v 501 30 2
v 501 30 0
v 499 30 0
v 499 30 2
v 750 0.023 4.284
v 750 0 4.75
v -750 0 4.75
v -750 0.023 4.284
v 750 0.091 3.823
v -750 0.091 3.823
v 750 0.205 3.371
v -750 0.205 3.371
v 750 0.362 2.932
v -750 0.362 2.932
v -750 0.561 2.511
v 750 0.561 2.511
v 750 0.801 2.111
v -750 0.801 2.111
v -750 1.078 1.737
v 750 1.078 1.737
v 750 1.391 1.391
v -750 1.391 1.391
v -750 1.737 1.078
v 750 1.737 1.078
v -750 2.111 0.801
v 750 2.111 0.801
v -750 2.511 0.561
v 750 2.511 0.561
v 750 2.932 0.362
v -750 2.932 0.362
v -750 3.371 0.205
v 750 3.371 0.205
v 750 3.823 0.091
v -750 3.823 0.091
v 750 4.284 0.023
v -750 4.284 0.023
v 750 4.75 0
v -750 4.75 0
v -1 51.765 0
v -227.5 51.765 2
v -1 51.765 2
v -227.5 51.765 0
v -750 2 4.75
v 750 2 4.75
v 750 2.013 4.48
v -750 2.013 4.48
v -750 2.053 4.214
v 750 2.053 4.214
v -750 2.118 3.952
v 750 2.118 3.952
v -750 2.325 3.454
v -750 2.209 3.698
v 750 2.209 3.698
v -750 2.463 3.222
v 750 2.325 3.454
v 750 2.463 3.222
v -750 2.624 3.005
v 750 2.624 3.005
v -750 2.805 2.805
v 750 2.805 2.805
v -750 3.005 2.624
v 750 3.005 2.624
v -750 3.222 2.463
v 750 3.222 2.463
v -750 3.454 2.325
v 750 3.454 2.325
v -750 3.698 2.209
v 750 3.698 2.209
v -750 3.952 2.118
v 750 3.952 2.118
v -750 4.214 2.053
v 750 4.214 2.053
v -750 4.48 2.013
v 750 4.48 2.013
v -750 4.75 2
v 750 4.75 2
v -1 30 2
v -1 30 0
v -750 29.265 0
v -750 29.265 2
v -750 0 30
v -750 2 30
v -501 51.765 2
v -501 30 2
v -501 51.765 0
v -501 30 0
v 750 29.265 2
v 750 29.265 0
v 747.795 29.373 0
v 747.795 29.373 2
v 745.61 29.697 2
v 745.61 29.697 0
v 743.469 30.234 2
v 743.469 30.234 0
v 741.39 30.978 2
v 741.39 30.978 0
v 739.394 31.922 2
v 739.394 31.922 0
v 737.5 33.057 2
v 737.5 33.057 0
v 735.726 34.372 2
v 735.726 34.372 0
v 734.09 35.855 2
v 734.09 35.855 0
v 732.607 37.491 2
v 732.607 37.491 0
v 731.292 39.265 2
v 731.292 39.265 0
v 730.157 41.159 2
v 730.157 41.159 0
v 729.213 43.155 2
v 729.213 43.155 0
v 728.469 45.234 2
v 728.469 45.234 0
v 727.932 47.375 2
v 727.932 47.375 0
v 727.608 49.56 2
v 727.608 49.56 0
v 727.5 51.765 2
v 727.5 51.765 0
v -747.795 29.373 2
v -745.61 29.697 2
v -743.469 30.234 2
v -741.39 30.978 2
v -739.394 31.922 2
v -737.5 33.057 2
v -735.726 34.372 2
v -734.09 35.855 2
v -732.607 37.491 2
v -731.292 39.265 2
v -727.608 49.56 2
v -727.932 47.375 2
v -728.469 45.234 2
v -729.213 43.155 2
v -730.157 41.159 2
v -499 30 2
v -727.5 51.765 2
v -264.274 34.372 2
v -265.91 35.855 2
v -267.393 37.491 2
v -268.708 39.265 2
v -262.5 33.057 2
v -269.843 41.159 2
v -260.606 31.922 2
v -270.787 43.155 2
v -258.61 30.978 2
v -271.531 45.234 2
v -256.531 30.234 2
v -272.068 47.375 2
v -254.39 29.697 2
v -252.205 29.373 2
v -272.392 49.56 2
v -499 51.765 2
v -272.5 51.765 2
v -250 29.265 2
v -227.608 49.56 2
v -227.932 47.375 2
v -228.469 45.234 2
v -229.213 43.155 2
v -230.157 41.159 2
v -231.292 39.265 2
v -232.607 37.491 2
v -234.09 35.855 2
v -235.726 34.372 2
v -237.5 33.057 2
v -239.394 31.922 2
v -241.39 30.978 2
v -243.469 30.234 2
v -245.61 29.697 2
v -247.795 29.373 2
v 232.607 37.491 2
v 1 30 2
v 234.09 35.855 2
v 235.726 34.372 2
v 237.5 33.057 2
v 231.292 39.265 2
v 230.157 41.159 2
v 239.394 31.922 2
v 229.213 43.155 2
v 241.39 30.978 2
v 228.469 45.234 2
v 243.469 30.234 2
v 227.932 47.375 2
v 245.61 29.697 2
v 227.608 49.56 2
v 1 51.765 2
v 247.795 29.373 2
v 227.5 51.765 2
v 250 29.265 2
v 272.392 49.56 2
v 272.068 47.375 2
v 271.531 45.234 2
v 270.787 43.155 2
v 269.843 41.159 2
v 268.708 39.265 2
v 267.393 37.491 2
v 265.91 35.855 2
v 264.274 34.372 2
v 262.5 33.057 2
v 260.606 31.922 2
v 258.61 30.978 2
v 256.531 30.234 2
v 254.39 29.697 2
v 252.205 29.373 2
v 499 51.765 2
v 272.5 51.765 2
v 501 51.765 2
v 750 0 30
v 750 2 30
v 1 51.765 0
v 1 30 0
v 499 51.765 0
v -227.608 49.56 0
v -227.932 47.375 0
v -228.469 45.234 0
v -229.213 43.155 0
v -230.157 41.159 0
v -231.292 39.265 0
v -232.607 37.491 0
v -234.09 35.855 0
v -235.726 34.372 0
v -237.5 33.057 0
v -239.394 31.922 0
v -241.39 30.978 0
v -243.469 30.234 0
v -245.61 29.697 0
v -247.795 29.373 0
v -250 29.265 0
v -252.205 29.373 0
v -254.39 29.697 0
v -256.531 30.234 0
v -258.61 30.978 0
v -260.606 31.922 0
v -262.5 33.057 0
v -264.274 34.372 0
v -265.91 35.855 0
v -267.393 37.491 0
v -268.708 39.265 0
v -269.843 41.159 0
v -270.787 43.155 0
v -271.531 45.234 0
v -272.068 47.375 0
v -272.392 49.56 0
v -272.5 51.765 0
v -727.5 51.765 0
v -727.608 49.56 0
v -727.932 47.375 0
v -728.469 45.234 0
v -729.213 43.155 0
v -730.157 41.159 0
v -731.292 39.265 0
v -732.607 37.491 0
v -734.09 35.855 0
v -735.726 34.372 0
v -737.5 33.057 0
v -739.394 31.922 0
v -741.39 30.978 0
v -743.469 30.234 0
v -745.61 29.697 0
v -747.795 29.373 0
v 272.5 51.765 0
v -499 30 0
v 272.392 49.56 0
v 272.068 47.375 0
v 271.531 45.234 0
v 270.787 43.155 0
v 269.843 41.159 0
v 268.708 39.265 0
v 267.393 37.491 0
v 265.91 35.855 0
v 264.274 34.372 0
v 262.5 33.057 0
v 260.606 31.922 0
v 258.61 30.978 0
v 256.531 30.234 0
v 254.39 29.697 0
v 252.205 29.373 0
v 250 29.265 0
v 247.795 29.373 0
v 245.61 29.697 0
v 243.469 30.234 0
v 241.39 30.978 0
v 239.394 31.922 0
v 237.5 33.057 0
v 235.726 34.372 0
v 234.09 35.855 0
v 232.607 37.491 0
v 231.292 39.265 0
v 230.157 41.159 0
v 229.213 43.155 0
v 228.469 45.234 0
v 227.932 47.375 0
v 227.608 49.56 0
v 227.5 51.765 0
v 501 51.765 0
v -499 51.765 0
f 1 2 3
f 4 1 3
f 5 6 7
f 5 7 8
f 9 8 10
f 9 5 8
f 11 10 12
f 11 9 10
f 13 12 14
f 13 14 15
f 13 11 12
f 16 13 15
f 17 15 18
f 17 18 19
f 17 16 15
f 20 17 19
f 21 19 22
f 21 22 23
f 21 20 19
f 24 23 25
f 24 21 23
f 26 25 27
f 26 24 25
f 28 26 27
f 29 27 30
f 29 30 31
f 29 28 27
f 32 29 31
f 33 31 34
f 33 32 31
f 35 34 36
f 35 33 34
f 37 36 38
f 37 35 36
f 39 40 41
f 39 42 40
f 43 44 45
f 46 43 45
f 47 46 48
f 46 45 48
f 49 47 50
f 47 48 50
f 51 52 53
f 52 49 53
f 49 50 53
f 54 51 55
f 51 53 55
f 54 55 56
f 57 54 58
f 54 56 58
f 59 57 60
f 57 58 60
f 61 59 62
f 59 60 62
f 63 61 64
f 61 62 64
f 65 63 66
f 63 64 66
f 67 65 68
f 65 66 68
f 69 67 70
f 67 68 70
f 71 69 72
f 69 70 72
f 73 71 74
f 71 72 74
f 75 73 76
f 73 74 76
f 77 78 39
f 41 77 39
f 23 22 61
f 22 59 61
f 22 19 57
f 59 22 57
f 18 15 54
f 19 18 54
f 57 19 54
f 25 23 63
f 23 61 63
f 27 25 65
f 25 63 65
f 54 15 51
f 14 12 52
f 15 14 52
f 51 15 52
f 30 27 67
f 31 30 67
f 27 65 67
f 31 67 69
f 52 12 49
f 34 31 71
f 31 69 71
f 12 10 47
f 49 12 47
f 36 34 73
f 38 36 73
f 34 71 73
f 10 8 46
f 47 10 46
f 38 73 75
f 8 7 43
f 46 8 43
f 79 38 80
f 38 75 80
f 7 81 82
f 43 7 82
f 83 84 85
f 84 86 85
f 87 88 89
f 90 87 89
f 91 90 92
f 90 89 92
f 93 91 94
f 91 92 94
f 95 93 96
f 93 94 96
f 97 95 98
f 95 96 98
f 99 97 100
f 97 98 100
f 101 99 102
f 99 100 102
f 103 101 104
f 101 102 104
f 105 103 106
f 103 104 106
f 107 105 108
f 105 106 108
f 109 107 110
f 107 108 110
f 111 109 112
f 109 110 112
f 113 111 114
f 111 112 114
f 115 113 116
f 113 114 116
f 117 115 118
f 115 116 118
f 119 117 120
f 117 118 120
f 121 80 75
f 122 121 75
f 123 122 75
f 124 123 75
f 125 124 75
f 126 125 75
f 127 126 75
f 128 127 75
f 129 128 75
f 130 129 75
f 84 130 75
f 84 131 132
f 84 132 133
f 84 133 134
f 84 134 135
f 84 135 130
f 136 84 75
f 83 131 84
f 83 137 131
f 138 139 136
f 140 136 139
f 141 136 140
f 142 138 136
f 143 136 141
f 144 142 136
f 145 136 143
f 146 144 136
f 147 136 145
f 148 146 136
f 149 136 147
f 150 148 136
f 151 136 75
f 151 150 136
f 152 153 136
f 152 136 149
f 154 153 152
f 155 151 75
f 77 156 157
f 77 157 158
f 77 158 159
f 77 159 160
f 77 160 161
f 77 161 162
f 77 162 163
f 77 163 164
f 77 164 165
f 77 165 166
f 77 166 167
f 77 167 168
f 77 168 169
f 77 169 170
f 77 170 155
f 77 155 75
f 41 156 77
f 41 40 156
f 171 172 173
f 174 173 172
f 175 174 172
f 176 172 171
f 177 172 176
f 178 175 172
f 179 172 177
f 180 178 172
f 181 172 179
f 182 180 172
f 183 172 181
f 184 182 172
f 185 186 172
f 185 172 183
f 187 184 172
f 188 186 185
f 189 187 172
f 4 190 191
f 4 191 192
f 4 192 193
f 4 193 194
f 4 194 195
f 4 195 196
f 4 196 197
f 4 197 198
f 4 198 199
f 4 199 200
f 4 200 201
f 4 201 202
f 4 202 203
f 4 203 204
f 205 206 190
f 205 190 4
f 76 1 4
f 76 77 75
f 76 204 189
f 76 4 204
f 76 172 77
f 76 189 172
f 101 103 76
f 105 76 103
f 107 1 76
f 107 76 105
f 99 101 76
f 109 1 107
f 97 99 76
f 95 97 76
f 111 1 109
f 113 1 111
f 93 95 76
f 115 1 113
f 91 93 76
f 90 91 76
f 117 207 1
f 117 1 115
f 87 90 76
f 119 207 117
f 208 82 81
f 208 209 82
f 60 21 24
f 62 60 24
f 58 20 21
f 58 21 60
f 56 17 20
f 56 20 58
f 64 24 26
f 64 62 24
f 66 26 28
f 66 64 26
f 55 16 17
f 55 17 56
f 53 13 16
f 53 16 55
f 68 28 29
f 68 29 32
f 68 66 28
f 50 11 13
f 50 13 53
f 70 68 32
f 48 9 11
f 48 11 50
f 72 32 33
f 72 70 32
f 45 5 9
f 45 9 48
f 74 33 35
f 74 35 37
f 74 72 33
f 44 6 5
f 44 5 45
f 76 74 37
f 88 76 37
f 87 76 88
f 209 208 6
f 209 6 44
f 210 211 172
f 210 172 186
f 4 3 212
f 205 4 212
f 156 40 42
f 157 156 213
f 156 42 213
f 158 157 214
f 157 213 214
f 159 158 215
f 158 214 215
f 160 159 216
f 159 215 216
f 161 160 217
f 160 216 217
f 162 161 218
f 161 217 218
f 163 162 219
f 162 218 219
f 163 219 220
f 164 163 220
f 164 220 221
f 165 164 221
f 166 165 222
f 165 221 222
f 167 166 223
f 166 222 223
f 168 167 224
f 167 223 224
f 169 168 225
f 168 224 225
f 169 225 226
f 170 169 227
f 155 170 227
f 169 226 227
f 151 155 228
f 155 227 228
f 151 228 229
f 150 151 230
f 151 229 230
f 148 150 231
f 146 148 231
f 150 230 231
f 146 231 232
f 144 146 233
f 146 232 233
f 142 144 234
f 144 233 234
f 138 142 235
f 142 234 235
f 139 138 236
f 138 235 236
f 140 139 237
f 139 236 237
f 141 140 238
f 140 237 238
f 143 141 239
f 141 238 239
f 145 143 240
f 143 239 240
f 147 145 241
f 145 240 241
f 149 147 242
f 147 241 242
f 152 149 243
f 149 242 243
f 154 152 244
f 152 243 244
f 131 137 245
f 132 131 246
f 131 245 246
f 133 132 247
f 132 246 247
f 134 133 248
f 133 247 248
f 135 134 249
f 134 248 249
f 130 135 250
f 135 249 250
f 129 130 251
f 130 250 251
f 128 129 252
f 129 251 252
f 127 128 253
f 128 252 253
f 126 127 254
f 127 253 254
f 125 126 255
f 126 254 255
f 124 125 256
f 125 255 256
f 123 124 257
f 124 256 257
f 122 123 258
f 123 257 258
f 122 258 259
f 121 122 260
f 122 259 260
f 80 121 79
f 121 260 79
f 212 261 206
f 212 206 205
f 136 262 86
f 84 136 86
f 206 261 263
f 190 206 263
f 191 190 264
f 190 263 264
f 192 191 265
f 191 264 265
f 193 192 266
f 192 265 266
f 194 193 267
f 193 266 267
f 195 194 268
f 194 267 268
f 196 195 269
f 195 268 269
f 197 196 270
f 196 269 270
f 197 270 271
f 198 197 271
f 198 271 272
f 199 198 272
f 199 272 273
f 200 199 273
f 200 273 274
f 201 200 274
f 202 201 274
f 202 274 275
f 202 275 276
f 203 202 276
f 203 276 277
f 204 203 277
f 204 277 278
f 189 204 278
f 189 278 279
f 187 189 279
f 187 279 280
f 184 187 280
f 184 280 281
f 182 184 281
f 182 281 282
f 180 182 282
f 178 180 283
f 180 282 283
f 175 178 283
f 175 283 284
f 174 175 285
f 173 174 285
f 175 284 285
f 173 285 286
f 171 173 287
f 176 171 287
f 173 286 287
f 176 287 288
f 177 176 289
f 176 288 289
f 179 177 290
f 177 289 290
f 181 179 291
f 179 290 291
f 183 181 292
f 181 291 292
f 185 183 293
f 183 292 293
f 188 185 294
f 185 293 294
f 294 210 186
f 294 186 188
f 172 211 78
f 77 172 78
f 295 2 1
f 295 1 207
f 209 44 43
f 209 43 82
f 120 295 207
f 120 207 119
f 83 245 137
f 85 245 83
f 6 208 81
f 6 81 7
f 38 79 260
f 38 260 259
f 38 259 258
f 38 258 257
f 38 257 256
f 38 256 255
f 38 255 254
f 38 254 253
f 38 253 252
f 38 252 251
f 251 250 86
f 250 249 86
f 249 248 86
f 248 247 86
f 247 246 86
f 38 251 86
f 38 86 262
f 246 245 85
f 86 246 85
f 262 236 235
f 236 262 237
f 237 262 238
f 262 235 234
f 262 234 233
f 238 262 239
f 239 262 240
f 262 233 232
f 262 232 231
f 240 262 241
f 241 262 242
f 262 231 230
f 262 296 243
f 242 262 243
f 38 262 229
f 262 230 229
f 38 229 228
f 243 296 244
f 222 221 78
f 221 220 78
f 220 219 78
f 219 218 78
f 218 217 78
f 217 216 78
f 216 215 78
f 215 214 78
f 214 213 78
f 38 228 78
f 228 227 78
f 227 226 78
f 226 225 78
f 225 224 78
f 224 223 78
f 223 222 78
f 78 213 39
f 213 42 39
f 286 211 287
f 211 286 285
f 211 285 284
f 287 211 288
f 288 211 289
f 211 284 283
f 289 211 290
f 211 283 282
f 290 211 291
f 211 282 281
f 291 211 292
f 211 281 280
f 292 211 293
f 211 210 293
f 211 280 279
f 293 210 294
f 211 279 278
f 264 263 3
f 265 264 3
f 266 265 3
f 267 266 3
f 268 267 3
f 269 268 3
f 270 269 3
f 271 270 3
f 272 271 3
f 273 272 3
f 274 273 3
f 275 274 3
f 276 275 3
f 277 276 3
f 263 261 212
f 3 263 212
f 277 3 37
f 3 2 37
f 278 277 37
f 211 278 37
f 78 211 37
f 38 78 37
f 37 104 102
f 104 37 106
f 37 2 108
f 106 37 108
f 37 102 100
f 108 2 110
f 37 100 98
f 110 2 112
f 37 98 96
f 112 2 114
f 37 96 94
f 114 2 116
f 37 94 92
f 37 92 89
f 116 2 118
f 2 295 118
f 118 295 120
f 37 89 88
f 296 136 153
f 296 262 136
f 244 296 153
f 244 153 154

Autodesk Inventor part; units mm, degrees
ref_plane "YZ Plane" through (0, 0, 0) normal (1, 0, 0) x (0, 1, 0)
ref_plane "XZ Plane" through (0, 0, 0) normal (0, 1, 0) x (-1, 0, 0)
ref_plane "XY Plane" through (0, 0, 0) normal (0, 0, 1) x (1, 0, 0)
sketch "Sketch1" plane through (0, 0, 0) normal (0, 0, 1) x (1, 0, 0)
  line L0 (-750, 51.765) -> (750, 51.765)
  line L1 (750, 51.765) -> (750, 0)
  line L2 (750, 0) -> (-750, 0)
  line L3 (-750, 0) -> (-750, 51.765)
  point P0 (0, 0)
  point P1 (0, 0)
  dimension "d0" = 1500
  dimension "d1" = 51.765
extrude "Plate1" add sketch "Sketch1" along normal blind 2
sketch "Sketch2" plane through (750, 2, 0) normal (0, -1, 0) x (1, 0, 0)
  line L0 (-1500, 0) -> (0, 0)
  line L1 (0, 0) -> (0, 30)
  line L2 (0, 30) -> (-1500, 30)
  line L3 (-1500, 30) -> (-1500, 0)
edge flange "Flange1" height 30 angle 90 thickness 2 bend radius 2.75 thickness toward (0, -1, 0) relief round relief width 2 relief depth 1 edges at (0, 0, 2) wall of the first edge with corners at (-750, 2, 0) (750, 2, 0) (750, 2, 30) (-750, 2, 30)
bend "Bend1"
corner "Corner1"
sketch "Sketch5" plane through (0, 0, 0) normal (0, 0, -1) x (-1, 0, 0)
  line L0 (750, 51.765) -> (-750, 51.765) projected
  line L1 (-1, 30) -> (-1, 51.765)
  line L2 (750, 0) -> (-750, 0) projected
  line L3 (-1, 30) -> (1, 30)
  line L4 (1, 30) -> (1, 51.765)
  point P0 (0, 0)
  point P1 (0, 30)
  point P2 (0, 0)
  dimension "d27" = 2
  dimension "d29" = 30
extrude "Extrusion1" cut sketch "Sketch5" against normal through all
pattern_linear "Rectangular Pattern1" count 3 spacing 500 along (1, 0, 0) of "Extrusion1" first direction both ways yes
sketch "Sketch6" plane through (0, 0, 0) normal (0, 0, -1) x (-1, 0, 0)
  line L0 (-750, 51.765) -> (-750, 4.75) projected
  circle A0 centre (-750, 51.765) radius 22.5
  line L1 (-750, 51.765) -> (750, 51.765) projected
  line L2 (-499, 30) -> (-501, 30) construction
  line L3 (-499, 30) -> (-1, 30) construction
  line L4 (-1, 30) -> (-1, 51.765) construction
  line L5 (-1, 51.765) -> (-499, 51.765) projected
  circle A1 centre (-250, 51.765) radius 22.5
  point P0 (0, 0)
  point P1 (-727.5, 51.765)
  point P2 (-750, 29.265)
  point P3 (-250, 30)
  point P4 (-227.5, 51.765)
  point P5 (-272.5, 51.765)
  dimension "d24" = 45
extrude "Extrusion2" cut sketch "Sketch6" against normal through all contours L1 A0 L0 | L1 A1 picked at (-748.3311, 36.953) picked at (-248.2369, 40.8343)
mirror "Mirror1" about plane through (0, 0, 0) normal (1, 0, 0) of "Extrusion2"
sketch "Sketch7" plane through (0, 0, 2) normal (0, 0, 1) x (1, 0, 0)
  arc A0 (-750, 29.265) -> (-727.5, 51.765) centre (-750, 51.765) ccw projected
  line L0 (-750, 4.75) -> (-750, 29.265) projected
  line L1 (-750, 4.75) -> (750, 4.75) projected
  line L2 (750, 29.265) -> (750, 4.75) projected
  arc A1 (727.5, 51.765) -> (750, 29.265) centre (750, 51.765) ccw projected
  line L3 (501, 51.765) -> (727.5, 51.765) projected
  line L4 (501, 51.765) -> (501, 30) projected
  line L5 (501, 30) -> (499, 30) projected
  line L6 (499, 30) -> (499, 51.765) projected
  line L7 (1, 51.765) -> (227.5, 51.765) projected
  line L8 (1, 51.765) -> (1, 30) projected
  line L9 (1, 30) -> (-1, 30) projected
  line L10 (-1, 30) -> (-1, 51.765) projected
  line L11 (-499, 51.765) -> (-272.5, 51.765) projected
  line L12 (-499, 51.765) -> (-499, 30) projected
  line L13 (-499, 30) -> (-501, 30) projected
  line L14 (-501, 30) -> (-501, 51.765) projected
  line L15 (-727.5, 51.765) -> (-501, 51.765) projected
  line L16 (649, 50.765) -> (651, 50.765)
  line L17 (651, 50.765) -> (651, 51.765)
  line L18 (651, 51.765) -> (649, 51.765)
  line L19 (649, 51.765) -> (649, 50.765)
  line L20 (650, 4.75) -> (650, 51.765) construction
  line L21 (272.5, 51.765) -> (499, 51.765) projected
  arc A2 (227.5, 51.765) -> (272.5, 51.765) centre (250, 51.765) ccw projected
  line L22 (-227.5, 51.765) -> (-1, 51.765) projected
  arc A3 (-272.5, 51.765) -> (-227.5, 51.765) centre (-250, 51.765) ccw projected
  point P0 (0, 0)
  point P1 (650, 50.765)
  point P2 (649, 51.265)
  point P3 (650, 28.2575)
  dimension "d30" = 2
  dimension "d31" = 1
  dimension "d33" = 100
extrude "Extrusion3" [suppressed]
mirror "Mirror2" [suppressed]
sketch "Sketch9" plane through (0, 0, 2) normal (0, 0, 1) x (1, 0, 0)
  line L0 (494, 46.765) -> (494, 34.765) construction
  line L1 (494, 34.765) -> (294, 34.765) construction
  line L2 (294, 34.765) -> (294, 46.765) construction
  line L3 (294, 46.765) -> (494, 46.765) construction
  line L4 (499, 30) -> (499, 51.765) projected
  line L5 (1, 51.765) -> (499, 51.765) projected
  point P0 (0, 0)
  dimension "d38" = 200
  dimension "d39" = 12
  dimension "d42" = 5
  dimension "d43" = 5
mark "Mark3"
equation "\"d1\" = Стрингер_1"
equation "\"d27\" = d18"
equation "\"d29\" = Стрингер_глубина_паза"
equation "\"d43\" = d42"
equation "\"d2\" = Thickness"
equation "\"d3\" = BendReliefWidth"
equation "\"d4\" = BendReliefDepth"
equation "\"d5\" = MinimumRemnant"
equation "\"d6\" = TransitionRadius"
equation "\"d9\" = BendRadius"
equation "\"d10\" = CornerReliefSize"
equation "\"d11\" = GapSize"
equation "\"d12\" = JacobiRadiusSize"
equation "\"BendReliefWidth\" = Thickness"
equation "\"BendReliefDepth\" = 0.5 * Thickness"
equation "\"CornerReliefSize\" = 4 * Thickness"
equation "\"MinimumRemnant\" = 2 * Thickness"
equation "\"TransitionRadius\" = BendRadius"
equation "\"JacobiRadiusSize\" = BendRadius"
equation "\"GapSize\" = Thickness"
equation "\"d18\" = Thickness"
equation "\"qqqqqq\" = 67.35706"
equation "\"Стрингер_1\" = 51.765032"
equation "\"Стрингер_глубина_паза\" = 30"
equation "\"Thickness\" = 2"
equation "\"BendRadius\" = 2.75"
properties part number "МОО 061 stringer back^" material "Stainless Steel"
